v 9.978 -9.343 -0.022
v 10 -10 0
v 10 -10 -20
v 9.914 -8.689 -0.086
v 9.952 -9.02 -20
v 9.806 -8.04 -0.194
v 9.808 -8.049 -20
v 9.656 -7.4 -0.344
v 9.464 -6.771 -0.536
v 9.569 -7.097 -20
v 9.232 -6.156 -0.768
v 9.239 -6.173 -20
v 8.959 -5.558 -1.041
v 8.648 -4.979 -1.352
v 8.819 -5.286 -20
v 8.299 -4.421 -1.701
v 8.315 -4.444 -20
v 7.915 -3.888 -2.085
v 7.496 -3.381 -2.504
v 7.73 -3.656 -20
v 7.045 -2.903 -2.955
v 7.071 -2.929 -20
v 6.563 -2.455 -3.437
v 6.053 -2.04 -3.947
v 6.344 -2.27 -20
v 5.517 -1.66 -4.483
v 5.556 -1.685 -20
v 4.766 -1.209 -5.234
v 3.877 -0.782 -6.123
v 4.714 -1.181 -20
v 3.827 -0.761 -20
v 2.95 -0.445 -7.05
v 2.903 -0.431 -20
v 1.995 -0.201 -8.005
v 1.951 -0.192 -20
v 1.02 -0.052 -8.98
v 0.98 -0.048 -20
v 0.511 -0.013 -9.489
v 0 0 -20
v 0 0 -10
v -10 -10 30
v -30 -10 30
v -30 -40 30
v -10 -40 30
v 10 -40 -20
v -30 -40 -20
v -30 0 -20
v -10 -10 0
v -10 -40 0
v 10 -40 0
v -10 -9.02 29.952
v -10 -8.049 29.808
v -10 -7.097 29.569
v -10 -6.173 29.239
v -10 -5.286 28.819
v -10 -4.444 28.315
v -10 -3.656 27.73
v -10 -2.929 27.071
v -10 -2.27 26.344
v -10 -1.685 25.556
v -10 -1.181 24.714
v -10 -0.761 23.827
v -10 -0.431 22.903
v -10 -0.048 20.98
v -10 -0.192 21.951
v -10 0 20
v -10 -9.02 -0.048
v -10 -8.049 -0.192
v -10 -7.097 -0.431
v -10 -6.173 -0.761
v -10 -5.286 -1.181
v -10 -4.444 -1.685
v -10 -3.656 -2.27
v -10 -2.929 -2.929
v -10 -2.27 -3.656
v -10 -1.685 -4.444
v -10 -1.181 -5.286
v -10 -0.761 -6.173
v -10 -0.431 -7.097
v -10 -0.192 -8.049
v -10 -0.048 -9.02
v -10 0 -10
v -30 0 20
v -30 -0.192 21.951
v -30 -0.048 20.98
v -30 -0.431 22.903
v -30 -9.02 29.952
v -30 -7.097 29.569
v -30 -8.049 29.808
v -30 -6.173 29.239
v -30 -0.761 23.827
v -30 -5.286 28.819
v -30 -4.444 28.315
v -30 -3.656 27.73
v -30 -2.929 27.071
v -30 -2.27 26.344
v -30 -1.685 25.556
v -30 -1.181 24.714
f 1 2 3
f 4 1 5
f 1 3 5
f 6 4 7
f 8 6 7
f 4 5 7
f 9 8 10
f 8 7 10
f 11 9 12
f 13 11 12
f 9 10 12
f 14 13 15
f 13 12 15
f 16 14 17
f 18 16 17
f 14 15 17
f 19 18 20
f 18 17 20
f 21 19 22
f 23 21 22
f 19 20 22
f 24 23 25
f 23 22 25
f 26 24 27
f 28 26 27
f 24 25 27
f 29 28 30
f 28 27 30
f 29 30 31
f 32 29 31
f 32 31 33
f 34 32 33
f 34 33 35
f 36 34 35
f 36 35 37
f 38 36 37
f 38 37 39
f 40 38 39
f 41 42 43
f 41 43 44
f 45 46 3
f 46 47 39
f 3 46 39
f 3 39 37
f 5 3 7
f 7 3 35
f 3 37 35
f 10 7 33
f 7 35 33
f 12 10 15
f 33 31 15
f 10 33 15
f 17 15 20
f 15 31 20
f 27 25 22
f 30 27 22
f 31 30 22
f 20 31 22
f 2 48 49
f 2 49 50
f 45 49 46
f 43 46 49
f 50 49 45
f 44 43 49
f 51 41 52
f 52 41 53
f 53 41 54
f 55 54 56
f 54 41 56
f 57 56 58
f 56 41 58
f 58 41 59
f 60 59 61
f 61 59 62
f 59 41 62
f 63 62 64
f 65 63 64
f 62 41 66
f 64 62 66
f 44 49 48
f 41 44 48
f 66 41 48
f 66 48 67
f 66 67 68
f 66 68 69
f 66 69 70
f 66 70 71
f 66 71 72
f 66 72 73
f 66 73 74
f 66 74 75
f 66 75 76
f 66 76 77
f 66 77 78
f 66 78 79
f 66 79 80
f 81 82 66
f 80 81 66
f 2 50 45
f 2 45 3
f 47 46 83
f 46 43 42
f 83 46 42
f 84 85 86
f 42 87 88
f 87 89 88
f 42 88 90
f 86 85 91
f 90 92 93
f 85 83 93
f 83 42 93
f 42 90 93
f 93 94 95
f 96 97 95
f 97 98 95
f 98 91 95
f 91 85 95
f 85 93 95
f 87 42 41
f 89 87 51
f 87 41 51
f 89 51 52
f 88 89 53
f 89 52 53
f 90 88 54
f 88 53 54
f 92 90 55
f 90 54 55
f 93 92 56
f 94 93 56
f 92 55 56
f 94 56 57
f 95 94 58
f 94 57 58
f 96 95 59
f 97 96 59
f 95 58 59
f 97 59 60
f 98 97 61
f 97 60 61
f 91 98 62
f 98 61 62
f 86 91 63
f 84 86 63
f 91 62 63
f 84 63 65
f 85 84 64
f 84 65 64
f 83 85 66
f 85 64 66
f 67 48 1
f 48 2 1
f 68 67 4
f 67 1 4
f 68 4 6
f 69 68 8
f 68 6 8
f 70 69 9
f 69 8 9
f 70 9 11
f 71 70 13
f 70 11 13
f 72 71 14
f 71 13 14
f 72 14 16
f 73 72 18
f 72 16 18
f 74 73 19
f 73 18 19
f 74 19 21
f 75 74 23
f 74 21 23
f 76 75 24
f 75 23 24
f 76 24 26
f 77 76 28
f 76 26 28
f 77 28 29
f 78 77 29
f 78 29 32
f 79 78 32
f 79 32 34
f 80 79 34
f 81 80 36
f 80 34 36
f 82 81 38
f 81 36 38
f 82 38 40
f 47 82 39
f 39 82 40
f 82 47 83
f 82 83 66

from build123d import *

# Parameters (mm, degrees)
SKETCH1_W           = 20
SKETCH1_H           = 40
BOSS_EXTRUDE1_DEPTH = 30
SKETCH2_W           = 40
SKETCH2_H           = 40
BOSS_EXTRUDE2_DEPTH = 20
FILLET1_R           = 10


with BuildPart() as part:
    # Sketch1 → Boss-Extrude1 (new body)
    with BuildSketch(Plane.XY):
        with Locations((-20, -20)):
            Rectangle(SKETCH1_W, SKETCH1_H)
    extrude(amount=BOSS_EXTRUDE1_DEPTH)

    # Sketch2 → Boss-Extrude2 (add)
    with BuildSketch(Plane.XY):
        with Locations((-10, -20)):
            Rectangle(SKETCH2_W, SKETCH2_H)
    extrude(amount=-BOSS_EXTRUDE2_DEPTH)

    # Fillet1
    fillet1_edges = [part.edges().sort_by_distance(p)[0] for p in [
        (0, 0, 0),
        (10, 0, -10),
        (-20, 0, 30),
    ]]
    fillet(fillet1_edges, radius=FILLET1_R)


solid = part.part
